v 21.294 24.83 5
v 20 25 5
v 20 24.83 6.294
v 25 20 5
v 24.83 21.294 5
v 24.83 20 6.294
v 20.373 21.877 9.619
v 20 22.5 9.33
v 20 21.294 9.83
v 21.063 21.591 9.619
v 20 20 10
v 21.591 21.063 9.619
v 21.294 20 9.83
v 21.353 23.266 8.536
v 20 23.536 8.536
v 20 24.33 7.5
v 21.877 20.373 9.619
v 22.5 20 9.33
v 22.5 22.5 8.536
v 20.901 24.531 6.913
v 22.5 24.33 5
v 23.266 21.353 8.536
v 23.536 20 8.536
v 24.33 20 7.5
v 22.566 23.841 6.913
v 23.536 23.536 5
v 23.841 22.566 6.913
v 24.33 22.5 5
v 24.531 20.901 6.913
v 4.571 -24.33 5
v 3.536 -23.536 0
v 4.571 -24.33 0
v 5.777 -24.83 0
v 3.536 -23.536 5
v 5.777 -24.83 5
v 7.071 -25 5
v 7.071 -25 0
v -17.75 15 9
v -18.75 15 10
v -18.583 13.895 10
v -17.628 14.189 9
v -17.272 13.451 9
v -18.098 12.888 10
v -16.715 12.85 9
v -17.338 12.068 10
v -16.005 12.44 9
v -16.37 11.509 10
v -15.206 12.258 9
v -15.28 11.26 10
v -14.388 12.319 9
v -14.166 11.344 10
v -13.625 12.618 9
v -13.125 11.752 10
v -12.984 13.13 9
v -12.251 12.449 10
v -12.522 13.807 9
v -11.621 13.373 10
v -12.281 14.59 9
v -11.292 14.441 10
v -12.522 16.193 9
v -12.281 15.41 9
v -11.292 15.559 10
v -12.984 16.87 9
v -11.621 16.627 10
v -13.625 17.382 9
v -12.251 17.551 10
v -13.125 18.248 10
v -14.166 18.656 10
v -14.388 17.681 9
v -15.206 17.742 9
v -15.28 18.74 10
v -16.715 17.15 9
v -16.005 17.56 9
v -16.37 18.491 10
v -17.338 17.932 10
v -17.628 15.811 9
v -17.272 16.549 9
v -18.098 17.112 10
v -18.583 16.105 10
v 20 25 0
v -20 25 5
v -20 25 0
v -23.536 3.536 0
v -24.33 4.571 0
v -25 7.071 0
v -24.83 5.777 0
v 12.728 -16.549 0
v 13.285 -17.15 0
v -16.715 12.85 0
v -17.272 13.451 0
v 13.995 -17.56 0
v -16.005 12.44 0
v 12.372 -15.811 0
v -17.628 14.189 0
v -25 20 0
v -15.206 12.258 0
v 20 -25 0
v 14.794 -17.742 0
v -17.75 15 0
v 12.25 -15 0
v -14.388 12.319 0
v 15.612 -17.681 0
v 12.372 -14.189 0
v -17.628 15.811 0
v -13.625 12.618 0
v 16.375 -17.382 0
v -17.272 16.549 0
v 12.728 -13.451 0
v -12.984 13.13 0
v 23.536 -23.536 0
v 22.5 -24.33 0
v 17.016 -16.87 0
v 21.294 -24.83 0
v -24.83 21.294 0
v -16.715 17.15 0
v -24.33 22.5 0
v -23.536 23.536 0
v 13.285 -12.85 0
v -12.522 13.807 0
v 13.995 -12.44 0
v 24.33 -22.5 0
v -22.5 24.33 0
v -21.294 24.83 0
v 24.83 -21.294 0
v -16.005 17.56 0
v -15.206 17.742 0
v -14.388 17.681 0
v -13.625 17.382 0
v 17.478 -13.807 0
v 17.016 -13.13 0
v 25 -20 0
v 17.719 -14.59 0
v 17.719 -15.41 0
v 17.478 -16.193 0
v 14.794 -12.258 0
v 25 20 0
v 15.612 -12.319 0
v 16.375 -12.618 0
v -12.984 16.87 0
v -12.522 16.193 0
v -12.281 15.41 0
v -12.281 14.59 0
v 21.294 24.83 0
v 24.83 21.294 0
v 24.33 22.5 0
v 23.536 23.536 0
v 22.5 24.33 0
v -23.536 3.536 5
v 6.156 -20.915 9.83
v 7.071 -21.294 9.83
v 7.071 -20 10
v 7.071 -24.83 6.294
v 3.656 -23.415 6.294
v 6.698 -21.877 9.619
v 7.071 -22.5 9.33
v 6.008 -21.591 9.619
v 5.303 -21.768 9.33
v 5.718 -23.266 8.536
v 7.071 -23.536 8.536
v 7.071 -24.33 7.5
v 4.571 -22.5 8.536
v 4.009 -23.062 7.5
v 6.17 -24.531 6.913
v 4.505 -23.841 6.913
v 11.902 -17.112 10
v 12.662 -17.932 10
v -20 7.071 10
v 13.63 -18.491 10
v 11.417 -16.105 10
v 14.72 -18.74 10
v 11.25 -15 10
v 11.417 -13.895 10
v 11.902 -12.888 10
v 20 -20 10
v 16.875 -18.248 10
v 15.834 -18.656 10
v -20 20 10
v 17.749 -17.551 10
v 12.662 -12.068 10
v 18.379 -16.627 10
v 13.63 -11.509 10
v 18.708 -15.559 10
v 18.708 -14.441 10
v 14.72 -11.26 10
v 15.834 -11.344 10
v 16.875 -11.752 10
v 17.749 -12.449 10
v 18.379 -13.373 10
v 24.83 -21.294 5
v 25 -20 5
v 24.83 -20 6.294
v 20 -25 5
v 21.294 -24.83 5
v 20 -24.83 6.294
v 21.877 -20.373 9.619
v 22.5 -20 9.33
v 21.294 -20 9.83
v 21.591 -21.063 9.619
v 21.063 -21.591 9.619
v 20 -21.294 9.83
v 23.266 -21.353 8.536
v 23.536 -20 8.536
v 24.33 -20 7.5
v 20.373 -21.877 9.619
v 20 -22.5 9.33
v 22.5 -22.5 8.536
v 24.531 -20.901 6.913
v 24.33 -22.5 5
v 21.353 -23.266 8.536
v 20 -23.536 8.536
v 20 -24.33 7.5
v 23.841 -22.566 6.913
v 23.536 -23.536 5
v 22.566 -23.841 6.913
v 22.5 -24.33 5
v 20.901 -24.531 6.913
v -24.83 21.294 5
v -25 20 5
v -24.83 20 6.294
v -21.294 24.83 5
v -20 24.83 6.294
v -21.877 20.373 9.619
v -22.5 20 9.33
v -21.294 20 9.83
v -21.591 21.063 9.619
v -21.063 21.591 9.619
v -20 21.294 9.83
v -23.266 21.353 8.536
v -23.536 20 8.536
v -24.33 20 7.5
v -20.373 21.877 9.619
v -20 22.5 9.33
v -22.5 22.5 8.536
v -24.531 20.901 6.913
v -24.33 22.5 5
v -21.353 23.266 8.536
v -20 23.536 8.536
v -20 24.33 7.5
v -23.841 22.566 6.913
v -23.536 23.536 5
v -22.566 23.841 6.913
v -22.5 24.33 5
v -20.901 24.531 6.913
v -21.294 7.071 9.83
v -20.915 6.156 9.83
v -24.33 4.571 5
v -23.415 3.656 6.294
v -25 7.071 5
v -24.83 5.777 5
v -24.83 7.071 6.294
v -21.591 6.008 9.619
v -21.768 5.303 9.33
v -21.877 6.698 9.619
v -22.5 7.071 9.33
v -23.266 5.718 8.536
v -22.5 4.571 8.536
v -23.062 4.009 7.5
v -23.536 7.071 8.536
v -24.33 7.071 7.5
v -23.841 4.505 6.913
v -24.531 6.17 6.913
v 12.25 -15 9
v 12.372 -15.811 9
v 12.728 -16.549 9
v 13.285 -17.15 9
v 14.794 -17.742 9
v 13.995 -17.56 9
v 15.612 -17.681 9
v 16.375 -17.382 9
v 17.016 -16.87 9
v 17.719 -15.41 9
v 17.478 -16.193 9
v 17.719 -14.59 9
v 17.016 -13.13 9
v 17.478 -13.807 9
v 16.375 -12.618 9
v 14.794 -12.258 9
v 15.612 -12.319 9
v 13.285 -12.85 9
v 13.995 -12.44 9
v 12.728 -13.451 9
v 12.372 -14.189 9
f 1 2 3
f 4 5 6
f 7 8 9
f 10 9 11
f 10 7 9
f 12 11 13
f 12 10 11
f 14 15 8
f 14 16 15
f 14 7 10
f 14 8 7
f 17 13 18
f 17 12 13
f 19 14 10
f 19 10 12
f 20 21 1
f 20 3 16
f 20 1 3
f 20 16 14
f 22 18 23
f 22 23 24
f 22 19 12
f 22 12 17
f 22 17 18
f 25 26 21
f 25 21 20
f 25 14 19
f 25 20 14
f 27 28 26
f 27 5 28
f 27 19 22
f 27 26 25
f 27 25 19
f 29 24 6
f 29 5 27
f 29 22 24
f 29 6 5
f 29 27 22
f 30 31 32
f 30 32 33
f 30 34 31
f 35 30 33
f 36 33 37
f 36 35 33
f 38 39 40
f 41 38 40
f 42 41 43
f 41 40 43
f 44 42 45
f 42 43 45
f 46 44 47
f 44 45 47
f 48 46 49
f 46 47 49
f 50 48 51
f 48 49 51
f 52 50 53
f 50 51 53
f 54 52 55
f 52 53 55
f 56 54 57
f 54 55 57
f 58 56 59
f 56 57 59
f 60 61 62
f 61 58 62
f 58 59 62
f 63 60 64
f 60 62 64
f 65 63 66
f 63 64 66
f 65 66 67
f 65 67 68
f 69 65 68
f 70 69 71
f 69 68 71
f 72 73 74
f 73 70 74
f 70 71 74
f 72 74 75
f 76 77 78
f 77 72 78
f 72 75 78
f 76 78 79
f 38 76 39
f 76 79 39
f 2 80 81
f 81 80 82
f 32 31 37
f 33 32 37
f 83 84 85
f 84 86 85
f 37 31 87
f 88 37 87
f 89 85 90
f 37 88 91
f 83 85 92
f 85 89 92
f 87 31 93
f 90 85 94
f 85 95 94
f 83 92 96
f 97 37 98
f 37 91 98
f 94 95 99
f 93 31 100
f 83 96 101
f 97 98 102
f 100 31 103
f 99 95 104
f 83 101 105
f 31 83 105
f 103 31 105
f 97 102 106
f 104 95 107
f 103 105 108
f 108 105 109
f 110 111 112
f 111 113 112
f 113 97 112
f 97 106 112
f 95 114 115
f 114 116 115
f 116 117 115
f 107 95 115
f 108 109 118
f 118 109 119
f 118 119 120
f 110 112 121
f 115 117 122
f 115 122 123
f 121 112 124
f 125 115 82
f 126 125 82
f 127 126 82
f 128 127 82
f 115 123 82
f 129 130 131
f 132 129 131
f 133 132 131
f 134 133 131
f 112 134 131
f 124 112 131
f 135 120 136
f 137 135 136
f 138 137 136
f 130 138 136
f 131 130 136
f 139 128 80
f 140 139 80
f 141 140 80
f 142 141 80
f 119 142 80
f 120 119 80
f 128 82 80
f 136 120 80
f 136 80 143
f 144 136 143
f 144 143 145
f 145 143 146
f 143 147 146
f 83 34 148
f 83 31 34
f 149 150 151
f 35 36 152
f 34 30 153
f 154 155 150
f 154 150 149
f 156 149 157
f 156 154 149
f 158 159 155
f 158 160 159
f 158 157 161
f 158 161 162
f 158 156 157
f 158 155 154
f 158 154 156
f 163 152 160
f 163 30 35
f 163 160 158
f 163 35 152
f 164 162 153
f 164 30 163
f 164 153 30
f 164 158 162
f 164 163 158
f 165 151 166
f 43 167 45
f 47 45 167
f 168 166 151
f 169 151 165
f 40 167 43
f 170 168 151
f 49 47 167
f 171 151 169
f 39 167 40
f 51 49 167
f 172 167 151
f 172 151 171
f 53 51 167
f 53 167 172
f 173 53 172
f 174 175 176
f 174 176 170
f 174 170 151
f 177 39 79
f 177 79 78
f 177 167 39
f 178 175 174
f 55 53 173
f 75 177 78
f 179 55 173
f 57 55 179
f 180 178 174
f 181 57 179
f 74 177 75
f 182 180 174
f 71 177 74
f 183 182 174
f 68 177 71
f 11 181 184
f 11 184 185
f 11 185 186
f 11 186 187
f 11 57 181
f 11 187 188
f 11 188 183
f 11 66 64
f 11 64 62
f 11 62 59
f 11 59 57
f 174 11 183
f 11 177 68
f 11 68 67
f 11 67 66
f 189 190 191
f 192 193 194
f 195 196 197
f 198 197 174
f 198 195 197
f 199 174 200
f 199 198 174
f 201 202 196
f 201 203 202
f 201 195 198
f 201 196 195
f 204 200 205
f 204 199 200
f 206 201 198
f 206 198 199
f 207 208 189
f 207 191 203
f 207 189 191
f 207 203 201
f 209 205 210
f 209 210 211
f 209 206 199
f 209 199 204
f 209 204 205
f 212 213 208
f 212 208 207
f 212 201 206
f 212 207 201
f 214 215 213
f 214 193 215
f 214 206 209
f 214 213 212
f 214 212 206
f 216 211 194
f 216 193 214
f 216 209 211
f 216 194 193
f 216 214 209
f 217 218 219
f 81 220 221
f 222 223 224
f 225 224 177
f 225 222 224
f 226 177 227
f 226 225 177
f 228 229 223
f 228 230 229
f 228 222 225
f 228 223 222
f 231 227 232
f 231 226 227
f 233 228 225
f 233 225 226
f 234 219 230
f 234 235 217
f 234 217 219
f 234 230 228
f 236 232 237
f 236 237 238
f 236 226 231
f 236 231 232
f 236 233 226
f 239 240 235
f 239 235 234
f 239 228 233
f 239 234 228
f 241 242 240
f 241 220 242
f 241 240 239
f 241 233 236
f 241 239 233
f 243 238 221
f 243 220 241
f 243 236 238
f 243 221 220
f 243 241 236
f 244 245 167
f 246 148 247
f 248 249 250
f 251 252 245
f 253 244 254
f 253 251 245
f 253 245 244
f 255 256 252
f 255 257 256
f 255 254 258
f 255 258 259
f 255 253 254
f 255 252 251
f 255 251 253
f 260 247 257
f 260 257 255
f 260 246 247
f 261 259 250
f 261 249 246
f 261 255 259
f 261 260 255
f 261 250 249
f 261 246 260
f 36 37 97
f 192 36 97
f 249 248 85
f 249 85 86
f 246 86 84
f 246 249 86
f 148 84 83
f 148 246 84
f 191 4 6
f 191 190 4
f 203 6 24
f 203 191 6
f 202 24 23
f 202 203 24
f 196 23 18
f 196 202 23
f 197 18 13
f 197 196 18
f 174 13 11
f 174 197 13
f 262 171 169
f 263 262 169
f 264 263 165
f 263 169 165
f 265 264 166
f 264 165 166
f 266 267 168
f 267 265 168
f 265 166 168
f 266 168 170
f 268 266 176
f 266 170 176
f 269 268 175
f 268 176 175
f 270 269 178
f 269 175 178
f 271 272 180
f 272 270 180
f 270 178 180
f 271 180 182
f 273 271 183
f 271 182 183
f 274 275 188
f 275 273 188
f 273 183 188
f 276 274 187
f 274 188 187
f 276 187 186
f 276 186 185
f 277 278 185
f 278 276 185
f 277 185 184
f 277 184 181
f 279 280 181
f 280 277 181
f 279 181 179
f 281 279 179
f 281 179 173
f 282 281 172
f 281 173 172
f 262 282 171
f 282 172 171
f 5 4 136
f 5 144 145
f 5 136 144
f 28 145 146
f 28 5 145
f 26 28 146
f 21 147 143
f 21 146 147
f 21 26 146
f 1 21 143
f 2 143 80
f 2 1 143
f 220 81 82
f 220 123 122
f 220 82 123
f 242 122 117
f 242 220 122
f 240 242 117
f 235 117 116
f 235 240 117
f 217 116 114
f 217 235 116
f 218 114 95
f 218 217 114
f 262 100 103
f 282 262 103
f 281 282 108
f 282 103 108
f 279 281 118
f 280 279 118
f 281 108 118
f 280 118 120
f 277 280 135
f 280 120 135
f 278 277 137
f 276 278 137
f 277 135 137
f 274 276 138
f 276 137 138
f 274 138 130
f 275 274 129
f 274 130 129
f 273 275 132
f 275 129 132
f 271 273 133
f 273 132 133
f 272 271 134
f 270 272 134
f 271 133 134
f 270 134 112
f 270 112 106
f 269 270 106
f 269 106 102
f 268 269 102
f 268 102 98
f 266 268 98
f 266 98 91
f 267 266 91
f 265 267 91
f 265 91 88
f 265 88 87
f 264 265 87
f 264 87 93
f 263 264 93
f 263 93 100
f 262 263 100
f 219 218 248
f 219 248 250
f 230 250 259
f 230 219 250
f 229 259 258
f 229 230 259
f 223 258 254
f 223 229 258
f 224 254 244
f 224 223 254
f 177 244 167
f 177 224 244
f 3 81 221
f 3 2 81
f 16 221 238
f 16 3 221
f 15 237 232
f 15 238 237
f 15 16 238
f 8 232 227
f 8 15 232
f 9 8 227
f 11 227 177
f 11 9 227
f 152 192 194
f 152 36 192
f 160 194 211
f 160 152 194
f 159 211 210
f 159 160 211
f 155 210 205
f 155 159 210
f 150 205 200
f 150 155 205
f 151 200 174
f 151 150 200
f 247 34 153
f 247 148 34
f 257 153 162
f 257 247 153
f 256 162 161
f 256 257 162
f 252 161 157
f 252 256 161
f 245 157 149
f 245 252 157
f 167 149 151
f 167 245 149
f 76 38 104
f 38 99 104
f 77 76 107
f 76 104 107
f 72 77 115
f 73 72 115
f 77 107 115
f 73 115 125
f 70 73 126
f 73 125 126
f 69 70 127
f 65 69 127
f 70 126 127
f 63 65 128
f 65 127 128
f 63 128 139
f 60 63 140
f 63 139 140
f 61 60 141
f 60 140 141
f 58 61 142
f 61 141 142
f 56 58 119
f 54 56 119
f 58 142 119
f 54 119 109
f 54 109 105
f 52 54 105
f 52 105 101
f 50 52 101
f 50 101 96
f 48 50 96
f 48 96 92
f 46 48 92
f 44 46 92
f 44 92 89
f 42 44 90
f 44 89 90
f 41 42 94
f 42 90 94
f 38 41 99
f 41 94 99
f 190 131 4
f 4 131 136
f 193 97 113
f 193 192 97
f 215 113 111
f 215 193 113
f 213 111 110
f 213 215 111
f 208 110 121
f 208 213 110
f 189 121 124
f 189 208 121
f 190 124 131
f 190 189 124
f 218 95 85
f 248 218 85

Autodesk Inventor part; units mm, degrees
ref_plane "YZ Plane" through (0, 0, 0) normal (1, 0, 0) x (0, 1, 0)
ref_plane "XZ Plane" through (0, 0, 0) normal (0, 1, 0) x (-1, 0, 0)
ref_plane "XY Plane" through (0, 0, 0) normal (0, 0, 1) x (1, 0, 0)
sketch "스케치1" plane through (0, 0, 0) normal (0, 0, 1) x (1, 0, 0)
  line L0 (5, -25) -> (25, -25)
  line L1 (25, -25) -> (25, 25)
  line L2 (25, 25) -> (-25, 25)
  line L3 (-25, 25) -> (-25, 5)
  line L4 (-10, -10) -> (25, 25) construction
  line L5 (25, -25) -> (-25, 25) construction
  line L6 (5, -25) -> (-25, 5)
  point P0 (0, 0)
  dimension "d0" = 50
  dimension "d1" = 50
  dimension "d2" = 20
  dimension "d3" = 20
extrude "돌출1" add sketch "스케치1" along normal blind 10
fillet "모깎기1" radius 5 5 edges at (25, 25, 5) (25, -25, 5) (-25, 25, 5) (-25, 5, 5) (5, -25, 5)
fillet "모깎기2" radius 5 10 edges at (23.5355, 23.5355, 10) (0, 25, 10) (-23.5355, 23.5355, 10) (-25, 13.5355, 10) (-24.6194, 5.1577, 10) (-10, -10, 10) (5.1577, -24.6194, 10) (13.5355, -25, 10) (23.5355, -23.5355, 10) (25, 0, 10)
sketch "스케치2" plane through (0, 0, 0) normal (0, 0, -1) x (-1, 0, 0)
  line L0 (25, 20) -> (25, 7.0711) projected
  line L1 (-20, 25) -> (20, 25) projected
  line L2 (-25, -20) -> (-25, 20) projected
  line L3 (-7.0711, -25) -> (-20, -25) projected
  line L4 (-15, 15) -> (15, 15) construction
  line L5 (-15, -15) -> (-15, 15) construction
  circle A0 centre (-15, -15) radius 2.75
  circle A1 centre (15, 15) radius 2.75
  point P0 (0, 0)
  point P1 (-25, 0)
  dimension "d8" = 10
  dimension "d10" = 10
  dimension "d11" = 10
  dimension "d12" = 10
  dimension "d13" = 5.5
  dimension "d14" = 5.5
extrude "돌출2" cut sketch "스케치2" against normal blind 10
chamfer "모따기1" distance 1 angle 45 2 edges at (-12.25, 15, 10) (17.75, -15, 10)
equation "\"d13\" = d14"
properties part number "모서리 결합"
